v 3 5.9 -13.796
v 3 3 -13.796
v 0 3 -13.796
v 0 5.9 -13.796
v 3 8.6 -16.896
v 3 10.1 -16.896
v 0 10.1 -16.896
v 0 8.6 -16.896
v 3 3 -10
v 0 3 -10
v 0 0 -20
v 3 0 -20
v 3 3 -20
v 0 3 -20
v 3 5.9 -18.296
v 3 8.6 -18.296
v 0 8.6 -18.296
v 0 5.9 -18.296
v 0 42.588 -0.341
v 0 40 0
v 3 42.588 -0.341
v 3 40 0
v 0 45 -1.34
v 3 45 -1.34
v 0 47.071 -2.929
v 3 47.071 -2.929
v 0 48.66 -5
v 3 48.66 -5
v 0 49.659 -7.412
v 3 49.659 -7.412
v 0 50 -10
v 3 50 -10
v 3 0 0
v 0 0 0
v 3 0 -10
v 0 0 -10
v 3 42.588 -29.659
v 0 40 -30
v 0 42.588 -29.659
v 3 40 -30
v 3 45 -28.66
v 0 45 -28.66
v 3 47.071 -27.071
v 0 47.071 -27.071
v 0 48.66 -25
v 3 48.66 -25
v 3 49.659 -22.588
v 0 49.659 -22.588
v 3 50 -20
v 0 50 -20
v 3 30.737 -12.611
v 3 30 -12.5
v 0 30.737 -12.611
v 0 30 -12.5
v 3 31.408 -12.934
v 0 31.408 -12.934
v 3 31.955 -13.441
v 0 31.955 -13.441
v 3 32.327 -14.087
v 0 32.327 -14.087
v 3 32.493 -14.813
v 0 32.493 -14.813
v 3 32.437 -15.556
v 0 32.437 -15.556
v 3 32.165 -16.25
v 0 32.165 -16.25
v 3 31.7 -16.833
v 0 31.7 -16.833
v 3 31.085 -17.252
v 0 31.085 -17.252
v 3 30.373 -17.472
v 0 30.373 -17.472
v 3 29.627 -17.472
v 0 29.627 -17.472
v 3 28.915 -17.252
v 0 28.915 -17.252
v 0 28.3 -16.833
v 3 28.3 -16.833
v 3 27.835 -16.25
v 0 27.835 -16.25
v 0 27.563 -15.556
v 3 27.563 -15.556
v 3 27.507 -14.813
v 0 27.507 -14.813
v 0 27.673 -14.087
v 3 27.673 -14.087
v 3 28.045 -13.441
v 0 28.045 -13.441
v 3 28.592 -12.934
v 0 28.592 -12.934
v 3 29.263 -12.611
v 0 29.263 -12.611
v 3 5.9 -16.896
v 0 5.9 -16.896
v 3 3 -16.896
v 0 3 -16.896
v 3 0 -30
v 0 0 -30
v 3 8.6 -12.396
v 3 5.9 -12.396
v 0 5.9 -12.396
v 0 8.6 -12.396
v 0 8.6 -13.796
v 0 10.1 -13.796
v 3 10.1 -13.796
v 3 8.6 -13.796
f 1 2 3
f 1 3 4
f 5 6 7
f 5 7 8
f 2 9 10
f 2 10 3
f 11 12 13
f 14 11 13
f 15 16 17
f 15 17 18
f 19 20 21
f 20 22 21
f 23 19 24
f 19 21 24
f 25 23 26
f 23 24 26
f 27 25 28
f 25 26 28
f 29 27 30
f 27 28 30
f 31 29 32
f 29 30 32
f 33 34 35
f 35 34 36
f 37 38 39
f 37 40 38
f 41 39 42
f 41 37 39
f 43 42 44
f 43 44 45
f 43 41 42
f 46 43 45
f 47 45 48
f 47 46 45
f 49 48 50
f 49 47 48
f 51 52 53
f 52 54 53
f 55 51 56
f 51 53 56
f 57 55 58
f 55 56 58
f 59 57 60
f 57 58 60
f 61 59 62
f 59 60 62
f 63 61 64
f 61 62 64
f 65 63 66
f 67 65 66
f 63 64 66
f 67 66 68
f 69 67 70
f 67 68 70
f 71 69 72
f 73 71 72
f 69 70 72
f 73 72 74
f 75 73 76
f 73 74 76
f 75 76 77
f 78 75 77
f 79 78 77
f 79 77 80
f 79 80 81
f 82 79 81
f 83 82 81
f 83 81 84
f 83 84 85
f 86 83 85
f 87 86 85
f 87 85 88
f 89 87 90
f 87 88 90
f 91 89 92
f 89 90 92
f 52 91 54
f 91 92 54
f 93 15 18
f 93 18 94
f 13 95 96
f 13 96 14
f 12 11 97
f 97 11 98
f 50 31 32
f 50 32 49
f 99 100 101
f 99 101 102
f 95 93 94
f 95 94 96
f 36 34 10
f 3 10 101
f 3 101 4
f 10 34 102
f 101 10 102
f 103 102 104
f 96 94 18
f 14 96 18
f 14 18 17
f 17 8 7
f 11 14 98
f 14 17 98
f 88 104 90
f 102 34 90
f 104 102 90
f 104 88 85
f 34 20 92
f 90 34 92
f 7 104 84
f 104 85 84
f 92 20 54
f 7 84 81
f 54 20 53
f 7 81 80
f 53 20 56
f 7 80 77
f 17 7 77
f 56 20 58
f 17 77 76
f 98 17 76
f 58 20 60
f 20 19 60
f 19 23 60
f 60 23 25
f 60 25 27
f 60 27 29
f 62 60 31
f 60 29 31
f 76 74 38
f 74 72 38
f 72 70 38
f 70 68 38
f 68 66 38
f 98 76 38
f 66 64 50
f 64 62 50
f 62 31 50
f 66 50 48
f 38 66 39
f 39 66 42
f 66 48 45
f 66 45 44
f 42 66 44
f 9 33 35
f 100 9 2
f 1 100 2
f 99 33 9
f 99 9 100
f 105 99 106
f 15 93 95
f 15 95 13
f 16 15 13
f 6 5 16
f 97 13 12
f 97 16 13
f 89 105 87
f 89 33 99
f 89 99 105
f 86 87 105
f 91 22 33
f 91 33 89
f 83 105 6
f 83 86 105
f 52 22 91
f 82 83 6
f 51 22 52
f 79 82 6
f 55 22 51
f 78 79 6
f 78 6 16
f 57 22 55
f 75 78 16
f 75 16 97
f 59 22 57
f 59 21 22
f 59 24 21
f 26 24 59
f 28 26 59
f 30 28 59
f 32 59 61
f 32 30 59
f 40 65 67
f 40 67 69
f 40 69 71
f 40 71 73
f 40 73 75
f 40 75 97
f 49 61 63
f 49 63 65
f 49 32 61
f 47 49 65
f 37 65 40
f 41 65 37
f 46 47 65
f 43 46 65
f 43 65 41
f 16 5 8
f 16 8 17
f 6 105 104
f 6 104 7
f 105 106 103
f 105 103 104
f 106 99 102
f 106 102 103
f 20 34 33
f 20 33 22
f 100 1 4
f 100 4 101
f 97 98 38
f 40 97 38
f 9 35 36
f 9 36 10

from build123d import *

# Parameters (mm, degrees)
SKETCH1_W                 = 30
SKETCH1_H                 = 50
BOSS_EXTRUDE1_DEPTH       = 3
FILLET1_R                 = 10
SKETCH2_W                 = 10
SKETCH2_H                 = 3
CUT_EXTRUDE1_DEPTH        = 3
F_5_0MM_DOWEL_HOLE1_D     = 5
F_5_0MM_DOWEL_HOLE1_DEPTH = 3
F_5_0MM_DOWEL_HOLE1_TIP   = 1.502151548
CUT_EXTRUDE2_DEPTH        = 3


with BuildPart() as part:
    # Sketch1 → Boss-Extrude1 (new body)
    with BuildSketch(Plane(origin=(0, 0, 0), x_dir=(0, 0, -1), z_dir=(1, 0, 0))):
        with Locations((15, 25)):
            Rectangle(SKETCH1_W, SKETCH1_H)
    extrude(amount=BOSS_EXTRUDE1_DEPTH)

    # Fillet1
    fillet1_edges = [part.edges().sort_by_distance(p)[0] for p in [
        (1.5, 50, 0),
        (1.5, 50, -30),
    ]]
    fillet(fillet1_edges, radius=FILLET1_R)

    # Sketch2 → Cut-Extrude1 (cut)
    with BuildSketch(Plane(origin=(3, 0, 0), x_dir=(0, 0, -1), z_dir=(1, 0, 0))):
        with Locations((15, 1.5)):
            Rectangle(SKETCH2_W, SKETCH2_H)
    extrude(amount=-CUT_EXTRUDE1_DEPTH, mode=Mode.SUBTRACT)

    # Ø5.0mm Dowel Hole1
    with Locations(Plane(origin=(3, 0, 0), x_dir=(0, 0, -1), z_dir=(1, 0, 0))):
        with Locations((15, 30)):
            Hole(F_5_0MM_DOWEL_HOLE1_D / 2, depth=F_5_0MM_DOWEL_HOLE1_DEPTH)
            with Locations((0, 0, -(F_5_0MM_DOWEL_HOLE1_DEPTH + F_5_0MM_DOWEL_HOLE1_TIP / 2))):  # 118° drill point
                Cone(0, F_5_0MM_DOWEL_HOLE1_D / 2, F_5_0MM_DOWEL_HOLE1_TIP, mode=Mode.SUBTRACT)

    # Sketch5 → Cut-Extrude2 (cut)
    with BuildSketch(Plane(origin=(3, 0, 0), x_dir=(0, 0, -1), z_dir=(1, 0, 0))):
        Polygon((13.796178669, 3), (13.796178669, 5.9), (12.396178669, 5.9), (12.396178669, 8.6), (13.796178669, 8.6), (13.796178669, 10.1), (16.896178669, 10.1), (16.896178669, 8.6), (18.296178669, 8.6), (18.296178669, 5.9), (16.896178669, 5.9), (16.896178669, 3), align=None)
    extrude(amount=-CUT_EXTRUDE2_DEPTH, mode=Mode.SUBTRACT)


solid = part.part
